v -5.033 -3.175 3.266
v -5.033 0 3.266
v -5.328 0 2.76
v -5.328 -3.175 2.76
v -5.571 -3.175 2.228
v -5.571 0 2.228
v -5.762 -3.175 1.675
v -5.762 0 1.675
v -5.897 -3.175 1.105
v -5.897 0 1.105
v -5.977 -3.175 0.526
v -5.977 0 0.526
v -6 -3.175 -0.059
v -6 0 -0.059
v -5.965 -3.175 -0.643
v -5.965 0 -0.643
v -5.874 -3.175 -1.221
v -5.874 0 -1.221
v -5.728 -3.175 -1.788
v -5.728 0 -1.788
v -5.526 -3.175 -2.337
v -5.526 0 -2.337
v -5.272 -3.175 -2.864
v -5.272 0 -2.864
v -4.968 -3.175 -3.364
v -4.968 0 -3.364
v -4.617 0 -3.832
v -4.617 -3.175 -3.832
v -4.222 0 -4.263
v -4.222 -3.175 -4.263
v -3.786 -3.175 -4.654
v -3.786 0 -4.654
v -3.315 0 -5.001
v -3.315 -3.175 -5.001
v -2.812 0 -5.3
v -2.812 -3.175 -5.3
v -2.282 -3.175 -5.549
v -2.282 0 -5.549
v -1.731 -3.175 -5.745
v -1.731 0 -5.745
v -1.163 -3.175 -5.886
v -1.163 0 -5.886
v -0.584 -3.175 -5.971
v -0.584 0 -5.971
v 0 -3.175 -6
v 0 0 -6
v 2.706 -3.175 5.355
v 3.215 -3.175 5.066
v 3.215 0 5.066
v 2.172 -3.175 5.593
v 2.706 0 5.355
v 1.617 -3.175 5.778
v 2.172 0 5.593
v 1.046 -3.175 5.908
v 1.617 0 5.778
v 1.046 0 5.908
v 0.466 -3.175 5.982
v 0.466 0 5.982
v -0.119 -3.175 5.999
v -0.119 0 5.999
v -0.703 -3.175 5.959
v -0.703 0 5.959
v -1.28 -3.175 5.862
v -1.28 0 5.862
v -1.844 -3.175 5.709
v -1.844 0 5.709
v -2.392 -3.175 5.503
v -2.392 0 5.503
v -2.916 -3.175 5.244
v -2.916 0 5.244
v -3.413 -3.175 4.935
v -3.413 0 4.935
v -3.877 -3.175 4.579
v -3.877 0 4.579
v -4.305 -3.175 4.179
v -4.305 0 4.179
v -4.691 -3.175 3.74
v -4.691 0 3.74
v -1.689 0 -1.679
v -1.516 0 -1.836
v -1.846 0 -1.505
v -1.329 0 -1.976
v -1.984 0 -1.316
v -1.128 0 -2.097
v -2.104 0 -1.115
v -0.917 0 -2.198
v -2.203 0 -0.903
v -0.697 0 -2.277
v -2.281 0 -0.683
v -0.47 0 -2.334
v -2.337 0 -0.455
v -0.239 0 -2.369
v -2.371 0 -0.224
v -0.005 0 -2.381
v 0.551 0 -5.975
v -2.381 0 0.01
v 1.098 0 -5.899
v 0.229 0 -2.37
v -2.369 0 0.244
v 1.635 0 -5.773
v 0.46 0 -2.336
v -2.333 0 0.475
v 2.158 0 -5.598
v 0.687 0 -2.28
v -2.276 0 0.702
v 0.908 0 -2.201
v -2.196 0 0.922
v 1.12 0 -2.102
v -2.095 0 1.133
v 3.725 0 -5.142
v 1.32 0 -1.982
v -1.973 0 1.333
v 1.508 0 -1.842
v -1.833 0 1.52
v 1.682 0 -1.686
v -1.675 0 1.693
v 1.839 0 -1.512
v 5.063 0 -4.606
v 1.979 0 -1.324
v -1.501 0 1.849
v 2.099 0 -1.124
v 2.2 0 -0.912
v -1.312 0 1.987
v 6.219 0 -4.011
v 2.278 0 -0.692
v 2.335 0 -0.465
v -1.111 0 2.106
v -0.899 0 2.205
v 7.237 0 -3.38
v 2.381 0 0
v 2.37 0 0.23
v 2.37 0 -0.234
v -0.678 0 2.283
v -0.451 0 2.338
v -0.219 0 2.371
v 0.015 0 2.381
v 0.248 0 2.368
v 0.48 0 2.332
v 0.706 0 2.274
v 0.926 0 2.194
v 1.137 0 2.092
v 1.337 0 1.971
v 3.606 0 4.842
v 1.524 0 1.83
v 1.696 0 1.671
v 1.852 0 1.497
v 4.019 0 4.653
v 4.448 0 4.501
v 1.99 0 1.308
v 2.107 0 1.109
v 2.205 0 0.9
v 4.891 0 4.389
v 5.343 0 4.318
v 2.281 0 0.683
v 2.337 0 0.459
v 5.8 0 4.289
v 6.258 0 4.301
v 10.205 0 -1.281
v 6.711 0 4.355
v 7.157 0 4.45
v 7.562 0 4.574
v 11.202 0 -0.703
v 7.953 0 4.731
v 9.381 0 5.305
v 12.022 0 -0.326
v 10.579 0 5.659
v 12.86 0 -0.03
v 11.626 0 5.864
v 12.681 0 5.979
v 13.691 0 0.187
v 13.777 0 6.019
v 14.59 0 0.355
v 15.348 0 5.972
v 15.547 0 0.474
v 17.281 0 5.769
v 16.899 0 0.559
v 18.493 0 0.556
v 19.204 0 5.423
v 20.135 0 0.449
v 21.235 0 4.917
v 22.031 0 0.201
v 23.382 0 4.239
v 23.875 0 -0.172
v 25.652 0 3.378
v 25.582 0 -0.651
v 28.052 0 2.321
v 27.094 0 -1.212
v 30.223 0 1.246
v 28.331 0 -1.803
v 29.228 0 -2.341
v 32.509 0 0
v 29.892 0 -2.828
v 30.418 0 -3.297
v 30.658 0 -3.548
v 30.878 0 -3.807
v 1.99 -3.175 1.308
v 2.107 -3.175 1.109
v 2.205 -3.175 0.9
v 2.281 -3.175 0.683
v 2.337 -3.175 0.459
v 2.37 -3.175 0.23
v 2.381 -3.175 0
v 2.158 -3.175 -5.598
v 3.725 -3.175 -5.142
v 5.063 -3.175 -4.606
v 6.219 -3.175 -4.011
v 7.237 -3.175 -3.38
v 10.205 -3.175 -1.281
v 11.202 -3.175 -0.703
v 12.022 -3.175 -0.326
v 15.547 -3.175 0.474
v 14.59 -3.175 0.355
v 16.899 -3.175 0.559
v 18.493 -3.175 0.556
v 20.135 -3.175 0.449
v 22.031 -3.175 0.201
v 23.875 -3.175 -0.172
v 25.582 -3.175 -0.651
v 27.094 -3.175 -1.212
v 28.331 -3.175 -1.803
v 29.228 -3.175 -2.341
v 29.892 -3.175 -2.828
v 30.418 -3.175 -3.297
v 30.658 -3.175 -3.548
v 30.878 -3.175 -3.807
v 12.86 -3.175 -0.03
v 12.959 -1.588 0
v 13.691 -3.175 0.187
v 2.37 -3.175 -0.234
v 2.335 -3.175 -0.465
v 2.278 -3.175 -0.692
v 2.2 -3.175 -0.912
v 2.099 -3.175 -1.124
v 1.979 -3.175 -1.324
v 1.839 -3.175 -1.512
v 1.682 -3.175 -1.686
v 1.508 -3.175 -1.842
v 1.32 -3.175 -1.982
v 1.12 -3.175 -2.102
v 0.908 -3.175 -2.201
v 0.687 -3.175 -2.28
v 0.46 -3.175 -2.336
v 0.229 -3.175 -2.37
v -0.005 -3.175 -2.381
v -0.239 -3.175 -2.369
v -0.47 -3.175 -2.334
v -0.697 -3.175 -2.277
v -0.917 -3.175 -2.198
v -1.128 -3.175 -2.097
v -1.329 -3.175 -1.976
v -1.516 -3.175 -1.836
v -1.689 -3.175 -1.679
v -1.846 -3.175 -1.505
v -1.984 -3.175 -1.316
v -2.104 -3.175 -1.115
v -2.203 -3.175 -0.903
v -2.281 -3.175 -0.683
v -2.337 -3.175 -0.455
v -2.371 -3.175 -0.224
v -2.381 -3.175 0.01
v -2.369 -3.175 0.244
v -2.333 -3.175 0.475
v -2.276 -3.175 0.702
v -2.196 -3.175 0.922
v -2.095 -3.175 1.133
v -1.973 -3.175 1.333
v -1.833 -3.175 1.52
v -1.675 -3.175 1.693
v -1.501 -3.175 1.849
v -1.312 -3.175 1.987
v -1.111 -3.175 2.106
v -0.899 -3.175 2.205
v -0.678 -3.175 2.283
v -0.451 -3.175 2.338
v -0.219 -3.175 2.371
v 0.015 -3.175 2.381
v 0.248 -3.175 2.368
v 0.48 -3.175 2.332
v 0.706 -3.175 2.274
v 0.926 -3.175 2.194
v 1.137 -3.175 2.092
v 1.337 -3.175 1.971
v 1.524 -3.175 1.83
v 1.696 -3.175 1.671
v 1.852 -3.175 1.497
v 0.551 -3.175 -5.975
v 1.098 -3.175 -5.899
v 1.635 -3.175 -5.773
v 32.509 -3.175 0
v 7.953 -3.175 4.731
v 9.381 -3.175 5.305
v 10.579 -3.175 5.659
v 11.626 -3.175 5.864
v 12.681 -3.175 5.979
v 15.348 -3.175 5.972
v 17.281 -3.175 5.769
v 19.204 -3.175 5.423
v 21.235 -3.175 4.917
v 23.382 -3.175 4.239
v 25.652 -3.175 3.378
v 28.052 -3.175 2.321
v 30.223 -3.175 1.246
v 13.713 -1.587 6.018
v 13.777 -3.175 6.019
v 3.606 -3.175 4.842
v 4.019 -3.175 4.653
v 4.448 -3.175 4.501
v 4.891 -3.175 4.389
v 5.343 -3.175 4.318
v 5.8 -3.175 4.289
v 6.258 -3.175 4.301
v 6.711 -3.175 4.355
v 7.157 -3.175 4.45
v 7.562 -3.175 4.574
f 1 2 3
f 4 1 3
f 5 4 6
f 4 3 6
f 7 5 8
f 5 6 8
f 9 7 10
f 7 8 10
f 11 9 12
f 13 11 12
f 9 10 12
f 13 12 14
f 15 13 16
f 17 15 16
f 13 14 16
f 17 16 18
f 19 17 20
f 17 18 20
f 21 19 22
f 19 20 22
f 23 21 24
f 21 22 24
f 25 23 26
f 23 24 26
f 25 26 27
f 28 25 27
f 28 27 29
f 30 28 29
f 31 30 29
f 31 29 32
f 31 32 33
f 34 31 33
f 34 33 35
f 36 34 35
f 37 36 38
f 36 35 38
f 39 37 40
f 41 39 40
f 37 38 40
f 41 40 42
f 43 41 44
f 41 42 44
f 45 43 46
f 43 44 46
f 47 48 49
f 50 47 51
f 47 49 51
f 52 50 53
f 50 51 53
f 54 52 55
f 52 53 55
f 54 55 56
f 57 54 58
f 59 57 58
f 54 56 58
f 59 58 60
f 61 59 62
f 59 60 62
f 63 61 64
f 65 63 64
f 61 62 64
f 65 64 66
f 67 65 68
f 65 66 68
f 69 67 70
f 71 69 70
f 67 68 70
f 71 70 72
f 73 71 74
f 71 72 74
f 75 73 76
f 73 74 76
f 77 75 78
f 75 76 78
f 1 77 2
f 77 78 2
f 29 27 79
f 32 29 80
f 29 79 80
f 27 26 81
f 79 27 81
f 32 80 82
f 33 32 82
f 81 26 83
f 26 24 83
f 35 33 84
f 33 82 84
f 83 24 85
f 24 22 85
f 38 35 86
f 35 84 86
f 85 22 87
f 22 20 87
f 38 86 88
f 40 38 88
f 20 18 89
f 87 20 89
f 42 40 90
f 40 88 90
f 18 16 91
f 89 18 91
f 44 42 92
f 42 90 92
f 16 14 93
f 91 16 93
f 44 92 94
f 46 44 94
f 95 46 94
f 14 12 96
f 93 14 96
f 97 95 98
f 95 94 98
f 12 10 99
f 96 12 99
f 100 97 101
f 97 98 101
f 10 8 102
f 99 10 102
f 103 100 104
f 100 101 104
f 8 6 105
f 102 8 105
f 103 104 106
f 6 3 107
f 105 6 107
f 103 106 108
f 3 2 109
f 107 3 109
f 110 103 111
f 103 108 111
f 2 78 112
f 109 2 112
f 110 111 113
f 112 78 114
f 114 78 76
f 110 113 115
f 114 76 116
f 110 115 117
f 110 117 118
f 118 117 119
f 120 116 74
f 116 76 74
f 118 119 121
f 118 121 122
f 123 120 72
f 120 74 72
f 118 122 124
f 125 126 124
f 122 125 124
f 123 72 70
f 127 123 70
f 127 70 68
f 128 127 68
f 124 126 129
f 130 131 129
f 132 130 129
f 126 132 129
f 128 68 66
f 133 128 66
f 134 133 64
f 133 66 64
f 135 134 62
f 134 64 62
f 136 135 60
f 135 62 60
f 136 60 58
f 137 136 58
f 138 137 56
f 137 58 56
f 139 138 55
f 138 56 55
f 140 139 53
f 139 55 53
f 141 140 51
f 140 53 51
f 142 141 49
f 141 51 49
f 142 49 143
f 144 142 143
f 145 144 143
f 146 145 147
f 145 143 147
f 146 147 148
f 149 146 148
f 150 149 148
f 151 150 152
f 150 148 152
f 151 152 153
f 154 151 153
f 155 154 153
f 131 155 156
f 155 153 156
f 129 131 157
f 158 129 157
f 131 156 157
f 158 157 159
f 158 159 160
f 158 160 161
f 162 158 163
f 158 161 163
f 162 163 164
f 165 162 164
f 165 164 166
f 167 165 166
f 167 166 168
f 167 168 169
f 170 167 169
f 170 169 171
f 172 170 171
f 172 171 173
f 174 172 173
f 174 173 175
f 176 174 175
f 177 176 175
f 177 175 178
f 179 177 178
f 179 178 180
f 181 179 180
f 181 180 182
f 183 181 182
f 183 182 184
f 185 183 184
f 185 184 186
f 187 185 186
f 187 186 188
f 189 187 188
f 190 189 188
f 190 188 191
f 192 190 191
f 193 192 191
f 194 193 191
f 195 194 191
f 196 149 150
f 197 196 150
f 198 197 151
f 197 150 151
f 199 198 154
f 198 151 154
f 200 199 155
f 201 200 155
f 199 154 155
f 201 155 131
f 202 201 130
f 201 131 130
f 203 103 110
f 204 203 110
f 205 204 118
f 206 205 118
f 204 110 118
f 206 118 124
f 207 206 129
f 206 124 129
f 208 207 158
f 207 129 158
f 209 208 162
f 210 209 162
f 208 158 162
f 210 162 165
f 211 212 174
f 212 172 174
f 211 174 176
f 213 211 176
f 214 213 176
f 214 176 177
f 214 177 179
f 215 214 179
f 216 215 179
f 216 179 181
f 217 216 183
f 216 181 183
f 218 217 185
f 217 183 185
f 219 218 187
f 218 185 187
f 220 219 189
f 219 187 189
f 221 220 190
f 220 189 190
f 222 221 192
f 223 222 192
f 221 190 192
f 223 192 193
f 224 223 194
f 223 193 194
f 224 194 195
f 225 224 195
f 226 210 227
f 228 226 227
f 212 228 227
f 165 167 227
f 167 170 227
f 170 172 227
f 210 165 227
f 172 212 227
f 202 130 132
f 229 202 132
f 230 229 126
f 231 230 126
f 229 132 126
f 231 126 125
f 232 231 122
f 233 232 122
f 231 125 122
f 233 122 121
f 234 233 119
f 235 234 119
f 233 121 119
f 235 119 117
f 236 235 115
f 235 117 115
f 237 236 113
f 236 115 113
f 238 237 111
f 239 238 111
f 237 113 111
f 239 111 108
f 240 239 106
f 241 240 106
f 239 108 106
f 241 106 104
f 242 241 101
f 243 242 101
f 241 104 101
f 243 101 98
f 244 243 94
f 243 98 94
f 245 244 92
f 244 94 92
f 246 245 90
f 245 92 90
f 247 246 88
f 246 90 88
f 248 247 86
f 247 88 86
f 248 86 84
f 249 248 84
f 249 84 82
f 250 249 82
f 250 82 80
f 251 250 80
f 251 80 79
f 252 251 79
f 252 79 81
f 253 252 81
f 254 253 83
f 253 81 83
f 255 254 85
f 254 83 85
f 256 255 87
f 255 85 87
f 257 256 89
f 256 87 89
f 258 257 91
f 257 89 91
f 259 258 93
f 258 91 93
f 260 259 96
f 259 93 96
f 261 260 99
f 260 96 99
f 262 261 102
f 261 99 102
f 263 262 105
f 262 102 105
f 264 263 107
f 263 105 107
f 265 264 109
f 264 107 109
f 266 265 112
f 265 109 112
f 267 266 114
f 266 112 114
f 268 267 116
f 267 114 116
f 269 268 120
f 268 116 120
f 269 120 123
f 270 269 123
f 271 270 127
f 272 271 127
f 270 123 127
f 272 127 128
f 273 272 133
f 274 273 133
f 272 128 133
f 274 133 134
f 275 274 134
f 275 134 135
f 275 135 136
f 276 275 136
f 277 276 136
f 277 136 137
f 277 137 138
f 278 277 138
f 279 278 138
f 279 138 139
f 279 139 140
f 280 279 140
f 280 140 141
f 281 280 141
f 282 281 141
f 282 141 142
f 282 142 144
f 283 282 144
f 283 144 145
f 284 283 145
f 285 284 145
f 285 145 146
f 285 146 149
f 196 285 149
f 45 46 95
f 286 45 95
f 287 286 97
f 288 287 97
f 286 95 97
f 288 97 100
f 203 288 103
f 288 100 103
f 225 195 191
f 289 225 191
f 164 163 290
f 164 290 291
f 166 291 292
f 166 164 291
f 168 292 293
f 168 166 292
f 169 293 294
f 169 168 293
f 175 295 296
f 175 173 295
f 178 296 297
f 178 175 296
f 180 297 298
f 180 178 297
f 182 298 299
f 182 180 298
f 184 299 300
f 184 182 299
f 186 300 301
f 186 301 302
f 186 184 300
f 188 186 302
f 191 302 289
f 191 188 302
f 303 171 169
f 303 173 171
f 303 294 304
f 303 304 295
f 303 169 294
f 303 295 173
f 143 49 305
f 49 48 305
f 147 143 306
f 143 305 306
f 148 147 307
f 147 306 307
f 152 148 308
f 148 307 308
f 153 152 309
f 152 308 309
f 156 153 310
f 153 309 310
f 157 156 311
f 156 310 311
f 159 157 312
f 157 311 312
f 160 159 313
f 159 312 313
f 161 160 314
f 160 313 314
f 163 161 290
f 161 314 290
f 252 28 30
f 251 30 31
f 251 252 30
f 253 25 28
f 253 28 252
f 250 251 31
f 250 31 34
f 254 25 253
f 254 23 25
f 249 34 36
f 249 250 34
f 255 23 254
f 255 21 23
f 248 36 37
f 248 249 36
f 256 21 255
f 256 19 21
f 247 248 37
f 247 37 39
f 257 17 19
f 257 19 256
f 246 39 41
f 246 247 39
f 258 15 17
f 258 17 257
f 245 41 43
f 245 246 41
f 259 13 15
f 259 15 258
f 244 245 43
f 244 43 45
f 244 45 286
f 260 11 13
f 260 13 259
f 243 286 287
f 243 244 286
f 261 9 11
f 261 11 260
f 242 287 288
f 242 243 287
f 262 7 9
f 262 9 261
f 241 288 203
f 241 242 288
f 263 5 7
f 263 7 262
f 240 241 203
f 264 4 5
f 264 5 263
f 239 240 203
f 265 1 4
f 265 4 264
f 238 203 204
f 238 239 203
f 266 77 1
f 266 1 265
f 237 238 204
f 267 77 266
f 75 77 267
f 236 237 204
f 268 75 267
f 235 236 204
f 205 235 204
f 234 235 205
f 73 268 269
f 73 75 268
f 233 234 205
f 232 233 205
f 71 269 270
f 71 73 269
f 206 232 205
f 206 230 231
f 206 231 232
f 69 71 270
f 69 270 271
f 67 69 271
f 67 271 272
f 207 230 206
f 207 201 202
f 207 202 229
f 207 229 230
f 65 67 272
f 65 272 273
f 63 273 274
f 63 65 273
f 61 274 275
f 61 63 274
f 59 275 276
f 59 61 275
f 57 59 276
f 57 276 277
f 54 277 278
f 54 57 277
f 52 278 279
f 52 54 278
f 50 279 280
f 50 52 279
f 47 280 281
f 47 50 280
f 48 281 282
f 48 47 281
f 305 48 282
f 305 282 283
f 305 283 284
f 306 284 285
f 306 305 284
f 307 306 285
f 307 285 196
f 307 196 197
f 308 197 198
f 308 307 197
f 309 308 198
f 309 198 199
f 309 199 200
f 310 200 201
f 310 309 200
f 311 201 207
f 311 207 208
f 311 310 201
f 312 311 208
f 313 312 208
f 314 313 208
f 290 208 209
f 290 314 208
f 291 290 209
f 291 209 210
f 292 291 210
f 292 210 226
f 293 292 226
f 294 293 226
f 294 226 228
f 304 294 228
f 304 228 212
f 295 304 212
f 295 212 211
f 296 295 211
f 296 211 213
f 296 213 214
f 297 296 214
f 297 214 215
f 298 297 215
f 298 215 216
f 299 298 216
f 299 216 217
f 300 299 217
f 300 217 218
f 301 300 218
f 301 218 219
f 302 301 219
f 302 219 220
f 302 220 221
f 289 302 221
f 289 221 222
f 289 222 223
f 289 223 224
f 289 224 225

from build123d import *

# Parameters (mm, degrees)
F1_DEPTH = 3.175
F2_R     = 5


# Not quite as in the source:
# - a length typed as a fraction of an inch, garbled in the dataset ("3 / 203.2 mm" for 3/8 in), is restored


with BuildPart() as f1:
    # F0 (on Front) → F1 (new body)
    with BuildSketch(Plane.XZ):
        with BuildLine():
            ThreePointArc((6, 0), (5.7619448426, 1.6733175524), (5.0666694563, 3.2138544803))
            ThreePointArc((5.0666694563, 3.2138544803), (0.0307741544, 5.9999210788), (-5.0334354285, 3.2656588595))
            ThreePointArc((-5.0334354285, 3.2656588595), (-5.2722838105, -2.8640920763), (0, -6))
            add(Edge.make_bspline(
                [(0, -6), (0.7881316779, -5.8923160671), (1.5037462454, -5.7565864603), (2.1584342276, -5.5983177549)],
                knots=[0, 0, 0, 0, 0.0486422356, 0.0486422356, 0.0486422356, 0.0486422356], degree=3))
            ThreePointArc((2.1584342276, -5.5983177549), (3.7803533787, -4.6592841008), (5.0334354285, -3.2656588595))
            ThreePointArc((5.0334354285, -3.2656588595), (5.7532865638, -1.7028487057), (6, 0))
        make_face()
        with BuildLine():
            ThreePointArc((1.9898590203, 1.3079803675), (2.281304819, 0.6826418425), (2.38125, 0))
            ThreePointArc((2.38125, 0), (-2.281304819, -0.6826418425), (1.9898590203, 1.3079803675))
        make_face(mode=Mode.SUBTRACT)
        with BuildLine():
            add(Edge.make_bspline(
                [(5.0666694563, 3.2138544803), (8.837595406, 5.414485816), (14.2440437805, 6.8995614863), (24.1781340673, 4.7387528577), (32.5091555715, 0)],
                knots=[0.1268767178, 0.1268767178, 0.1268767178, 0.1268767178, 0.46554979, 1, 1, 1, 1], degree=3))
            ThreePointArc((5.0666694563, 3.2138544803), (5.7619448426, 1.6733175524), (6, 0))
            ThreePointArc((6, 0), (5.7532865638, -1.7028487057), (5.0334354285, -3.2656588595))
            ThreePointArc((5.0334354285, -3.2656588595), (3.7803533787, -4.6592841008), (2.1584342276, -5.5983177549))
            add(Edge.make_bspline(
                [(2.1584342276, -5.5983177549), (7.8149044031, -4.2308843573), (10.3239452596, 2.6732879939), (27.8337137958, 0), (30.8784303042, -3.806720163)],
                knots=[0.0486422356, 0.0486422356, 0.0486422356, 0.0486422356, 0.4689086255, 1, 1, 1, 1], degree=3))
            Line((30.8784303042, -3.806720163), (32.5091555715, 0))
        make_face()
        with BuildLine():
            add(Edge.make_bspline(
                [(0, -6), (0.7881316779, -5.8923160671), (1.5037462454, -5.7565864603), (2.1584342276, -5.5983177549)],
                knots=[0, 0, 0, 0, 0.0486422356, 0.0486422356, 0.0486422356, 0.0486422356], degree=3))
            ThreePointArc((0, -6), (1.0977462071, -5.8987247151), (2.1584342276, -5.5983177549))
        make_face()
    extrude(amount=F1_DEPTH)

    # F2
    f2_edges = [f1.edges().sort_by_distance(p)[0] for p in [
        (5.066669, -1.5875, 3.213854),
    ]]
    fillet(f2_edges, radius=F2_R)


solid = f1.part
